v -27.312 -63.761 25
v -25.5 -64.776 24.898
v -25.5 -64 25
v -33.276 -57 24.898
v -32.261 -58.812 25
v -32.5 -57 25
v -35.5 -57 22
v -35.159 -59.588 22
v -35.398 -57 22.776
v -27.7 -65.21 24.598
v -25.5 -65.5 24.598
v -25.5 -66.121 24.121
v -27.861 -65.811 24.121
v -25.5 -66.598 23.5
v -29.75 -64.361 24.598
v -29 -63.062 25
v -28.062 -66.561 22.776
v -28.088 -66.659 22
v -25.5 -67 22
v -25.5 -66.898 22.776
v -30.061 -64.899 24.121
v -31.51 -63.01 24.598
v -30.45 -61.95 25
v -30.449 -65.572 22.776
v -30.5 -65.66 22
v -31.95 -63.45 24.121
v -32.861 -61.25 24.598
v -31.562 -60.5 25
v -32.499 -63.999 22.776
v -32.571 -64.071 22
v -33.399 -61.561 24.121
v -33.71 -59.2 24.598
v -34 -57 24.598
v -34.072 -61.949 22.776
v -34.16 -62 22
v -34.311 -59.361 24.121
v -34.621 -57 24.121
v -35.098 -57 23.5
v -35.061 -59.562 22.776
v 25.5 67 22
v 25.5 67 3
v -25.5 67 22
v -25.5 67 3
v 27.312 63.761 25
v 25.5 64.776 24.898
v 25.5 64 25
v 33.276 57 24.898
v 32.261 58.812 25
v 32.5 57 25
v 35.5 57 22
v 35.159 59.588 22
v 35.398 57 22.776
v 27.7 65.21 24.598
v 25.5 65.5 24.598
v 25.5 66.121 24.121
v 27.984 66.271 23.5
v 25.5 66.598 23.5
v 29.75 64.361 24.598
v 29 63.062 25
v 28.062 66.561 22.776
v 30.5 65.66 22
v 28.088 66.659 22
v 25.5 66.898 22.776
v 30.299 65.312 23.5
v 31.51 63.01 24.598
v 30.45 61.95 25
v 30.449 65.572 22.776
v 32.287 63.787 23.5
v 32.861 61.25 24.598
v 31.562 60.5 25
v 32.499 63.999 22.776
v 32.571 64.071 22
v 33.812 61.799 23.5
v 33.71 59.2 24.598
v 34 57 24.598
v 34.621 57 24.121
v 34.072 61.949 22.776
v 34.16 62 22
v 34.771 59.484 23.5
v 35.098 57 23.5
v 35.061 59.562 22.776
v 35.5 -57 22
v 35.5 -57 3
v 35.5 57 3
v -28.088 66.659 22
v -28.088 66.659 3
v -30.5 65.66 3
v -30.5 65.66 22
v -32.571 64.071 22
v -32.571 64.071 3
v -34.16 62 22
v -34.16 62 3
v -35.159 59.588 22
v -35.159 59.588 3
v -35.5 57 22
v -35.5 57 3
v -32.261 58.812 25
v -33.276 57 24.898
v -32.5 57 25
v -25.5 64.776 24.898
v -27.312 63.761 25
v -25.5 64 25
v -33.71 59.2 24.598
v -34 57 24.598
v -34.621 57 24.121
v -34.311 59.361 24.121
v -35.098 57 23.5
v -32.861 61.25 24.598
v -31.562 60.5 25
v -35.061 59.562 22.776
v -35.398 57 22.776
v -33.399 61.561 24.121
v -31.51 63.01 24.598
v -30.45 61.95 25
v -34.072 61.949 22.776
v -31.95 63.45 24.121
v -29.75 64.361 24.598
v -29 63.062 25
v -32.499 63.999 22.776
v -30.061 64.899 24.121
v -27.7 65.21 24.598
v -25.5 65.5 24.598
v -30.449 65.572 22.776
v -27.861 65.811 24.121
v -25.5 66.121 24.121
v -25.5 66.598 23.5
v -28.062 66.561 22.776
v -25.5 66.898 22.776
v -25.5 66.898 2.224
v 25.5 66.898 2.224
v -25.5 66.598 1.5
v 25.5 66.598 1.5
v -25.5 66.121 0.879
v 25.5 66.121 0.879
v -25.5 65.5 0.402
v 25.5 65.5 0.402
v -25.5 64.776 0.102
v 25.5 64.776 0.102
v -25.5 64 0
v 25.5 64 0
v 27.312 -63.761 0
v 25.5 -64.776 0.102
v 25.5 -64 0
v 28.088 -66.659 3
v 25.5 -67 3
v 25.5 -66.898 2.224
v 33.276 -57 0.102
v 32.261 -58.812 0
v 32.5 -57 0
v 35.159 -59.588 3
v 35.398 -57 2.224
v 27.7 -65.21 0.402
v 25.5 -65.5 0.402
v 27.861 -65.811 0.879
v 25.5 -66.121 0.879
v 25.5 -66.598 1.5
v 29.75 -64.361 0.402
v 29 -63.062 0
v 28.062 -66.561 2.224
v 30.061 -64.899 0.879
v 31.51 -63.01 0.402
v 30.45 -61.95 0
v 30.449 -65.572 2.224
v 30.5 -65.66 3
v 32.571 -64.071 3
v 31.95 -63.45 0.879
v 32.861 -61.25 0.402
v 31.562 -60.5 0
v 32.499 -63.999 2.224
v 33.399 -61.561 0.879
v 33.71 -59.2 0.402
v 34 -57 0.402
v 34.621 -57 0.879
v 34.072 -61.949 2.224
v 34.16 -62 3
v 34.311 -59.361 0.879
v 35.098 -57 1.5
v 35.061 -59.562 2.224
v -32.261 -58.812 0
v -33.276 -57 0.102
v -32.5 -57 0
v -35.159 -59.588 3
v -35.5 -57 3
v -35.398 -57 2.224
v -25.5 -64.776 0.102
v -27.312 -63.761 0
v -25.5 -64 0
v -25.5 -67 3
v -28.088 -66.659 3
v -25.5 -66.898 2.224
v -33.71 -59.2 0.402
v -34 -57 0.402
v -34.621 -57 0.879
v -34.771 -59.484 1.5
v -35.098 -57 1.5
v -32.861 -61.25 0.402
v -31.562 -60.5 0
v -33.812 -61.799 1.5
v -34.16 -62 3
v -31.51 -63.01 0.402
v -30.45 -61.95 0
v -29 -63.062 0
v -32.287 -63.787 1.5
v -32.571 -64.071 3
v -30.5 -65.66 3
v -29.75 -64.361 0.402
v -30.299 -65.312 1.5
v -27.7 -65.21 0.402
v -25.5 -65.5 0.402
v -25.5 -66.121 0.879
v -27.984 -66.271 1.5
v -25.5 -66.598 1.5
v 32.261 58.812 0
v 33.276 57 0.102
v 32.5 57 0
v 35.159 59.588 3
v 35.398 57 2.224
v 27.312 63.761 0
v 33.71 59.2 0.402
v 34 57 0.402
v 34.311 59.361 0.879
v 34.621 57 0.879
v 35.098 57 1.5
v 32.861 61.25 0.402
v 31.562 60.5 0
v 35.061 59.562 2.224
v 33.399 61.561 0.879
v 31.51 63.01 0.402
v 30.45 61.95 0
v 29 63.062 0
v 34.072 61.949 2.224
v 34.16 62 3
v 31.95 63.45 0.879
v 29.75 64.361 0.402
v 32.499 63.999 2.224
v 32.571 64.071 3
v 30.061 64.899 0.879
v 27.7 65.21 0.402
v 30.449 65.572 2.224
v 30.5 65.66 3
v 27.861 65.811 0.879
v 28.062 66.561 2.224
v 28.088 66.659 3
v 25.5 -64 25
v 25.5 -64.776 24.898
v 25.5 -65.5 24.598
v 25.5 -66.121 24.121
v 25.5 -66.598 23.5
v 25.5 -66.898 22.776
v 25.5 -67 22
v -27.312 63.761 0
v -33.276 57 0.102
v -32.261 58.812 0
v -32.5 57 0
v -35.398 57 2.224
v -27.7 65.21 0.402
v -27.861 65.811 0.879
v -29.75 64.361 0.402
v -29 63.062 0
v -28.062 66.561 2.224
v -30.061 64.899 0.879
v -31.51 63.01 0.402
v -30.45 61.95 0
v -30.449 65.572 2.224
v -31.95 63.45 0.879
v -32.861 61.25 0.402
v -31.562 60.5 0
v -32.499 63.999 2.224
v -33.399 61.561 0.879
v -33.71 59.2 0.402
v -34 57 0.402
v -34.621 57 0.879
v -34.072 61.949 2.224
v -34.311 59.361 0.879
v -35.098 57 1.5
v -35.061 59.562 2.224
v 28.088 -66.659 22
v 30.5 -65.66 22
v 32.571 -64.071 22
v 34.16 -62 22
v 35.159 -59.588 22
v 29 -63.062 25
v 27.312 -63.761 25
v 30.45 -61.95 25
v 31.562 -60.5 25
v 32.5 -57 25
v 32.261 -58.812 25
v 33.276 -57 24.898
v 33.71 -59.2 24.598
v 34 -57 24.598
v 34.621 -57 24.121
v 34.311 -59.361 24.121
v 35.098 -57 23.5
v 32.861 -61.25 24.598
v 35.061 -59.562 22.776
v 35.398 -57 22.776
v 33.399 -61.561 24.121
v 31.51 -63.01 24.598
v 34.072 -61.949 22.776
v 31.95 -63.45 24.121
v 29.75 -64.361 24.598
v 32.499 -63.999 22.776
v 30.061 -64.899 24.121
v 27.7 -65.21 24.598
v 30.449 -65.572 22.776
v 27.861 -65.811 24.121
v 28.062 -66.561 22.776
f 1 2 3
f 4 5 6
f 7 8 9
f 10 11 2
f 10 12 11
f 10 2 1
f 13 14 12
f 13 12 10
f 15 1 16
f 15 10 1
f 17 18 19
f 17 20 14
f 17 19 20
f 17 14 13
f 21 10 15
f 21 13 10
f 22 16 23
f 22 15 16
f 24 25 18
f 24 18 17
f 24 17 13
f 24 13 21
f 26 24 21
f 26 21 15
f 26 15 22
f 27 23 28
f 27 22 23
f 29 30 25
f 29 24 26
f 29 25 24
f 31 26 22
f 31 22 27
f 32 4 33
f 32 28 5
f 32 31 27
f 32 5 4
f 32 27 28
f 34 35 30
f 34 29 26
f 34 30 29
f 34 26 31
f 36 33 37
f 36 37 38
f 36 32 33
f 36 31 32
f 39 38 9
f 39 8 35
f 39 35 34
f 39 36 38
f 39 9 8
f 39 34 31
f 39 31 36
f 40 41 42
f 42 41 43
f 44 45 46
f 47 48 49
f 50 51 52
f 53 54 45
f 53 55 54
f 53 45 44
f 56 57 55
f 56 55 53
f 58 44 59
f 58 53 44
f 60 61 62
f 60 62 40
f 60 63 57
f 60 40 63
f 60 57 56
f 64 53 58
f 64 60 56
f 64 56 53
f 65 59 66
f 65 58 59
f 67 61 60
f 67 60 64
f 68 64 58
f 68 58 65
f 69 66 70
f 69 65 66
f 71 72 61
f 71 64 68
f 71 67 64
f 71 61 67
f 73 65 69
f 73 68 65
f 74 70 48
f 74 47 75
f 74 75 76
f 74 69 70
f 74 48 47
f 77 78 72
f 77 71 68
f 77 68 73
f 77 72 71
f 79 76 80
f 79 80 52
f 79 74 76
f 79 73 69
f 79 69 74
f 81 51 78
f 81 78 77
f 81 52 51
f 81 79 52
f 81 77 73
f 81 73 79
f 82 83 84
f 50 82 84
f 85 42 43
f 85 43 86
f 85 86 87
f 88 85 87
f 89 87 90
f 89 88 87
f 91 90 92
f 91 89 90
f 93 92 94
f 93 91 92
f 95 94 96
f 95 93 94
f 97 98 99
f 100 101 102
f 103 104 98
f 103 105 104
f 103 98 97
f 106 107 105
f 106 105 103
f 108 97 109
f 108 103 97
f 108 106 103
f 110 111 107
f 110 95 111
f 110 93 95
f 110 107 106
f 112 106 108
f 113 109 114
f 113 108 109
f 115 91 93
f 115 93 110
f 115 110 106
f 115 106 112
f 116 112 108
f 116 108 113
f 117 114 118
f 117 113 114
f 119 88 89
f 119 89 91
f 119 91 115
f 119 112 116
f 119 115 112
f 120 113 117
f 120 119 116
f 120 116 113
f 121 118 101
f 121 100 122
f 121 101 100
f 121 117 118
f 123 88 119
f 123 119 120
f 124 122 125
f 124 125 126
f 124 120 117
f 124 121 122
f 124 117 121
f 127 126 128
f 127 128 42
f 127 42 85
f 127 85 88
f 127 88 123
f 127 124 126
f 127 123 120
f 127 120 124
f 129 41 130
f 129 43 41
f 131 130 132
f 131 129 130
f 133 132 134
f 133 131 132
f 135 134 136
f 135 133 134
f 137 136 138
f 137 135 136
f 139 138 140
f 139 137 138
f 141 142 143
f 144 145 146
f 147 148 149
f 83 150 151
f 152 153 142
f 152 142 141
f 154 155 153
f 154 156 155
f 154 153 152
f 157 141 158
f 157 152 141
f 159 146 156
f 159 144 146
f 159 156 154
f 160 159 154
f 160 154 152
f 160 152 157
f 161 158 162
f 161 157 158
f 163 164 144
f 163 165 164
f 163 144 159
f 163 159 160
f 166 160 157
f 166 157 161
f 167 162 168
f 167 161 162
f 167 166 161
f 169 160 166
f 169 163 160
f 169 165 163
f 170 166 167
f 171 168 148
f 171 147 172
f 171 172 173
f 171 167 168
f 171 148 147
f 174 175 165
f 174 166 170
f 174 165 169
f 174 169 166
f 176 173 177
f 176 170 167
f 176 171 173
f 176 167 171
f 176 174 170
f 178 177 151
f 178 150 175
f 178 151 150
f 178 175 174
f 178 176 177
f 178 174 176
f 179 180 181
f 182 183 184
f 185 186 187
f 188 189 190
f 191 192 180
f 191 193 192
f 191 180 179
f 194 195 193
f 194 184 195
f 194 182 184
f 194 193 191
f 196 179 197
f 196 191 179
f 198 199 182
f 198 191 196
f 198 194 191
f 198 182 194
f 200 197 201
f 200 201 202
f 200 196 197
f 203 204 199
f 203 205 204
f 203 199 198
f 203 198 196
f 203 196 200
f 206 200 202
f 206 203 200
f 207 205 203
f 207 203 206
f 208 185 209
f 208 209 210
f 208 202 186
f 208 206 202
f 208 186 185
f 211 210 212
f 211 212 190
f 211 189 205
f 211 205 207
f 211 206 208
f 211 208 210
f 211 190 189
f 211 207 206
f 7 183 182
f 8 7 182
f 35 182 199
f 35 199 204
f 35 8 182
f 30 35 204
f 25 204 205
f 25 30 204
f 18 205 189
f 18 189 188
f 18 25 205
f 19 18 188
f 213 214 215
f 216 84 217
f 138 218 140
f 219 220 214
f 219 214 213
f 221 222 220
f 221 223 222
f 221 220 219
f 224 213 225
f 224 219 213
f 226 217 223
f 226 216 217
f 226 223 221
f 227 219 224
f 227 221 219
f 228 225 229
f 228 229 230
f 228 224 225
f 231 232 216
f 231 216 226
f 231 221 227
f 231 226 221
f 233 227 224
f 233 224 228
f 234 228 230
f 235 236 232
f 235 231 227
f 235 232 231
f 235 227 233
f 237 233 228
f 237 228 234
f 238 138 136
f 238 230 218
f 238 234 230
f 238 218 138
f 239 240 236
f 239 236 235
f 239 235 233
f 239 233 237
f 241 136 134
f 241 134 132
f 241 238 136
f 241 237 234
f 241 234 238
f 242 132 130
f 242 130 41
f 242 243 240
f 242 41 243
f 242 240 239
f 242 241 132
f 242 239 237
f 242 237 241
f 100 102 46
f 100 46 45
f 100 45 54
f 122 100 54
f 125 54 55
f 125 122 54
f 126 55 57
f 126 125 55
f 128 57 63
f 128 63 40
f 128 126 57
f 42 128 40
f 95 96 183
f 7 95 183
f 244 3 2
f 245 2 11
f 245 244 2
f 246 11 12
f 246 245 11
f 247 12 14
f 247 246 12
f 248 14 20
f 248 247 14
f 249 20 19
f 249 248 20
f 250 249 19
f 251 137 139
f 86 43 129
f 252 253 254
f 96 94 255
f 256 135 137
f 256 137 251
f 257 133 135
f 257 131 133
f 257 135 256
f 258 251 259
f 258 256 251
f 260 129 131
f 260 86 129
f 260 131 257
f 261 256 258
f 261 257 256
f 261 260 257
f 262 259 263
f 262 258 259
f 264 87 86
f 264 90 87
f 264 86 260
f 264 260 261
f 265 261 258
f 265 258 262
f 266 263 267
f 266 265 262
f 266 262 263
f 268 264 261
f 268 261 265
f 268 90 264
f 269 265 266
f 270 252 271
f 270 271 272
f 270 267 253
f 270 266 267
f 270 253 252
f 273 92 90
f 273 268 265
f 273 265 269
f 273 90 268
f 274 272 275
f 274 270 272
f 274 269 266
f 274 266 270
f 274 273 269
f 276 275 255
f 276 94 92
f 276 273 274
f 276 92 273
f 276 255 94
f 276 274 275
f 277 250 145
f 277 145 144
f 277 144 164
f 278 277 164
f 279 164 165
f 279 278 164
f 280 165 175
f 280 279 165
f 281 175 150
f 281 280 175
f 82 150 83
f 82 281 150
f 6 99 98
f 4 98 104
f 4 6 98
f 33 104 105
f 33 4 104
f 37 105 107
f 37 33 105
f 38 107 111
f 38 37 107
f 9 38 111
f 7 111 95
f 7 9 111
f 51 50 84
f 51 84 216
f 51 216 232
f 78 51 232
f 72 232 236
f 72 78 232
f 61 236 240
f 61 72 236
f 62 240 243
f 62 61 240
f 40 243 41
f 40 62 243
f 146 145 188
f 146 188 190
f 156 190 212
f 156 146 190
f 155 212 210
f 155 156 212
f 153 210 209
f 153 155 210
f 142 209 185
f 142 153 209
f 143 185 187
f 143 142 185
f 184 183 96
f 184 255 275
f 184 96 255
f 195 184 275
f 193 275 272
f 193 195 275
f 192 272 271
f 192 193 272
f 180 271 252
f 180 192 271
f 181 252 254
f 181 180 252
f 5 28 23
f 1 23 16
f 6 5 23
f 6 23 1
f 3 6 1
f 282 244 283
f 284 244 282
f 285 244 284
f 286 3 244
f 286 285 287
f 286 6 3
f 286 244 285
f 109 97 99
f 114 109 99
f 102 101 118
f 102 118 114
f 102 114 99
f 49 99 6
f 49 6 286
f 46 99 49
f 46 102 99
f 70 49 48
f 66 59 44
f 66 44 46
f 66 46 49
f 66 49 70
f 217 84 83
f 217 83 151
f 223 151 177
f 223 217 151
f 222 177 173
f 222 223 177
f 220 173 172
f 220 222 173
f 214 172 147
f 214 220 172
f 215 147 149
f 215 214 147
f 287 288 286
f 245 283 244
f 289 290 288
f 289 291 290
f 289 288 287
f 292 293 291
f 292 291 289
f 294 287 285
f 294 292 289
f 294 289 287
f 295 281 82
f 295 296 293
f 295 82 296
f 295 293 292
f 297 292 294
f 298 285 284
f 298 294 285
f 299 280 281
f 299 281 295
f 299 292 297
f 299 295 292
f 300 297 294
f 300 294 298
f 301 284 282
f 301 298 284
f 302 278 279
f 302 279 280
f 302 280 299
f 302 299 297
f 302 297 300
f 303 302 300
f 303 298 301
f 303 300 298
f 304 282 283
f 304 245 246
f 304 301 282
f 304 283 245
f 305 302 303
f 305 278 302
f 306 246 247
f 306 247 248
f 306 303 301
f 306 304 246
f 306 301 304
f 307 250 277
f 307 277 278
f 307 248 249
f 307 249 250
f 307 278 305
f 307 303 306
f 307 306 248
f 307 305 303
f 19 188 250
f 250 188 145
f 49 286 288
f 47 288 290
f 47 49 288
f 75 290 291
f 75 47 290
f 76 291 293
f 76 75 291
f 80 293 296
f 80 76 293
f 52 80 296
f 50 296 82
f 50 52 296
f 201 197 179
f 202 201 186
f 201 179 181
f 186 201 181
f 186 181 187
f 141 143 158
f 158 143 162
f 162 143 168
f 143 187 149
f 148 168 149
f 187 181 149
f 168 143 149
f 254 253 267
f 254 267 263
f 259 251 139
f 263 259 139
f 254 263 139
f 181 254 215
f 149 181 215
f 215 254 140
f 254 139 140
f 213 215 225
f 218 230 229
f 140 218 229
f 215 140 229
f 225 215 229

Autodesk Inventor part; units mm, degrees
ref_plane "YZ Plane" through (0, 0, 0) normal (1, 0, 0) x (0, 1, 0)
ref_plane "XZ Plane" through (0, 0, 0) normal (0, 1, 0) x (-1, 0, 0)
ref_plane "XY Plane" through (0, 0, 0) normal (0, 0, 1) x (1, 0, 0)
sketch "Sketch1" plane through (0, 0, 0) normal (0, 0, 1) x (1, 0, 0)
  line L0 (-35.5, -67) -> (35.5, -67)
  line L1 (35.5, -67) -> (35.5, 67)
  line L2 (35.5, 67) -> (-35.5, 67)
  line L3 (-35.5, 67) -> (-35.5, -67)
  line L4 (-35.5, -67) -> (35.5, 67) construction
  line L5 (35.5, -67) -> (-35.5, 67) construction
  point P0 (0, 0)
  dimension "d0" = 71
  dimension "d1" = 134
extrude "Extrusion1" add sketch "Sketch1" along normal blind 25
fillet "Fillet1" radius 10 4 edges at (-35.5, 67, 12.5) (35.5, 67, 12.5) (-35.5, -67, 12.5) (35.5, -67, 12.5)
fillet "Fillet2" radius 3 16 edges at (-32.5711, -64.0711, 0) (0, -67, 0) (32.5711, -64.0711, 0) (35.5, 0, 0) (32.5711, 64.0711, 0) (0, 67, 0) (-32.5711, 64.0711, 0) (-35.5, 0, 0) (0, 67, 25) (32.5711, 64.0711, 25) (35.5, 0, 25) (32.5711, -64.0711, 25) (0, -67, 25) (-32.5711, -64.0711, 25) (-35.5, 0, 25) (-32.5711, 64.0711, 25)
properties part number "powerbank" material "PC/ABS Plastic"
